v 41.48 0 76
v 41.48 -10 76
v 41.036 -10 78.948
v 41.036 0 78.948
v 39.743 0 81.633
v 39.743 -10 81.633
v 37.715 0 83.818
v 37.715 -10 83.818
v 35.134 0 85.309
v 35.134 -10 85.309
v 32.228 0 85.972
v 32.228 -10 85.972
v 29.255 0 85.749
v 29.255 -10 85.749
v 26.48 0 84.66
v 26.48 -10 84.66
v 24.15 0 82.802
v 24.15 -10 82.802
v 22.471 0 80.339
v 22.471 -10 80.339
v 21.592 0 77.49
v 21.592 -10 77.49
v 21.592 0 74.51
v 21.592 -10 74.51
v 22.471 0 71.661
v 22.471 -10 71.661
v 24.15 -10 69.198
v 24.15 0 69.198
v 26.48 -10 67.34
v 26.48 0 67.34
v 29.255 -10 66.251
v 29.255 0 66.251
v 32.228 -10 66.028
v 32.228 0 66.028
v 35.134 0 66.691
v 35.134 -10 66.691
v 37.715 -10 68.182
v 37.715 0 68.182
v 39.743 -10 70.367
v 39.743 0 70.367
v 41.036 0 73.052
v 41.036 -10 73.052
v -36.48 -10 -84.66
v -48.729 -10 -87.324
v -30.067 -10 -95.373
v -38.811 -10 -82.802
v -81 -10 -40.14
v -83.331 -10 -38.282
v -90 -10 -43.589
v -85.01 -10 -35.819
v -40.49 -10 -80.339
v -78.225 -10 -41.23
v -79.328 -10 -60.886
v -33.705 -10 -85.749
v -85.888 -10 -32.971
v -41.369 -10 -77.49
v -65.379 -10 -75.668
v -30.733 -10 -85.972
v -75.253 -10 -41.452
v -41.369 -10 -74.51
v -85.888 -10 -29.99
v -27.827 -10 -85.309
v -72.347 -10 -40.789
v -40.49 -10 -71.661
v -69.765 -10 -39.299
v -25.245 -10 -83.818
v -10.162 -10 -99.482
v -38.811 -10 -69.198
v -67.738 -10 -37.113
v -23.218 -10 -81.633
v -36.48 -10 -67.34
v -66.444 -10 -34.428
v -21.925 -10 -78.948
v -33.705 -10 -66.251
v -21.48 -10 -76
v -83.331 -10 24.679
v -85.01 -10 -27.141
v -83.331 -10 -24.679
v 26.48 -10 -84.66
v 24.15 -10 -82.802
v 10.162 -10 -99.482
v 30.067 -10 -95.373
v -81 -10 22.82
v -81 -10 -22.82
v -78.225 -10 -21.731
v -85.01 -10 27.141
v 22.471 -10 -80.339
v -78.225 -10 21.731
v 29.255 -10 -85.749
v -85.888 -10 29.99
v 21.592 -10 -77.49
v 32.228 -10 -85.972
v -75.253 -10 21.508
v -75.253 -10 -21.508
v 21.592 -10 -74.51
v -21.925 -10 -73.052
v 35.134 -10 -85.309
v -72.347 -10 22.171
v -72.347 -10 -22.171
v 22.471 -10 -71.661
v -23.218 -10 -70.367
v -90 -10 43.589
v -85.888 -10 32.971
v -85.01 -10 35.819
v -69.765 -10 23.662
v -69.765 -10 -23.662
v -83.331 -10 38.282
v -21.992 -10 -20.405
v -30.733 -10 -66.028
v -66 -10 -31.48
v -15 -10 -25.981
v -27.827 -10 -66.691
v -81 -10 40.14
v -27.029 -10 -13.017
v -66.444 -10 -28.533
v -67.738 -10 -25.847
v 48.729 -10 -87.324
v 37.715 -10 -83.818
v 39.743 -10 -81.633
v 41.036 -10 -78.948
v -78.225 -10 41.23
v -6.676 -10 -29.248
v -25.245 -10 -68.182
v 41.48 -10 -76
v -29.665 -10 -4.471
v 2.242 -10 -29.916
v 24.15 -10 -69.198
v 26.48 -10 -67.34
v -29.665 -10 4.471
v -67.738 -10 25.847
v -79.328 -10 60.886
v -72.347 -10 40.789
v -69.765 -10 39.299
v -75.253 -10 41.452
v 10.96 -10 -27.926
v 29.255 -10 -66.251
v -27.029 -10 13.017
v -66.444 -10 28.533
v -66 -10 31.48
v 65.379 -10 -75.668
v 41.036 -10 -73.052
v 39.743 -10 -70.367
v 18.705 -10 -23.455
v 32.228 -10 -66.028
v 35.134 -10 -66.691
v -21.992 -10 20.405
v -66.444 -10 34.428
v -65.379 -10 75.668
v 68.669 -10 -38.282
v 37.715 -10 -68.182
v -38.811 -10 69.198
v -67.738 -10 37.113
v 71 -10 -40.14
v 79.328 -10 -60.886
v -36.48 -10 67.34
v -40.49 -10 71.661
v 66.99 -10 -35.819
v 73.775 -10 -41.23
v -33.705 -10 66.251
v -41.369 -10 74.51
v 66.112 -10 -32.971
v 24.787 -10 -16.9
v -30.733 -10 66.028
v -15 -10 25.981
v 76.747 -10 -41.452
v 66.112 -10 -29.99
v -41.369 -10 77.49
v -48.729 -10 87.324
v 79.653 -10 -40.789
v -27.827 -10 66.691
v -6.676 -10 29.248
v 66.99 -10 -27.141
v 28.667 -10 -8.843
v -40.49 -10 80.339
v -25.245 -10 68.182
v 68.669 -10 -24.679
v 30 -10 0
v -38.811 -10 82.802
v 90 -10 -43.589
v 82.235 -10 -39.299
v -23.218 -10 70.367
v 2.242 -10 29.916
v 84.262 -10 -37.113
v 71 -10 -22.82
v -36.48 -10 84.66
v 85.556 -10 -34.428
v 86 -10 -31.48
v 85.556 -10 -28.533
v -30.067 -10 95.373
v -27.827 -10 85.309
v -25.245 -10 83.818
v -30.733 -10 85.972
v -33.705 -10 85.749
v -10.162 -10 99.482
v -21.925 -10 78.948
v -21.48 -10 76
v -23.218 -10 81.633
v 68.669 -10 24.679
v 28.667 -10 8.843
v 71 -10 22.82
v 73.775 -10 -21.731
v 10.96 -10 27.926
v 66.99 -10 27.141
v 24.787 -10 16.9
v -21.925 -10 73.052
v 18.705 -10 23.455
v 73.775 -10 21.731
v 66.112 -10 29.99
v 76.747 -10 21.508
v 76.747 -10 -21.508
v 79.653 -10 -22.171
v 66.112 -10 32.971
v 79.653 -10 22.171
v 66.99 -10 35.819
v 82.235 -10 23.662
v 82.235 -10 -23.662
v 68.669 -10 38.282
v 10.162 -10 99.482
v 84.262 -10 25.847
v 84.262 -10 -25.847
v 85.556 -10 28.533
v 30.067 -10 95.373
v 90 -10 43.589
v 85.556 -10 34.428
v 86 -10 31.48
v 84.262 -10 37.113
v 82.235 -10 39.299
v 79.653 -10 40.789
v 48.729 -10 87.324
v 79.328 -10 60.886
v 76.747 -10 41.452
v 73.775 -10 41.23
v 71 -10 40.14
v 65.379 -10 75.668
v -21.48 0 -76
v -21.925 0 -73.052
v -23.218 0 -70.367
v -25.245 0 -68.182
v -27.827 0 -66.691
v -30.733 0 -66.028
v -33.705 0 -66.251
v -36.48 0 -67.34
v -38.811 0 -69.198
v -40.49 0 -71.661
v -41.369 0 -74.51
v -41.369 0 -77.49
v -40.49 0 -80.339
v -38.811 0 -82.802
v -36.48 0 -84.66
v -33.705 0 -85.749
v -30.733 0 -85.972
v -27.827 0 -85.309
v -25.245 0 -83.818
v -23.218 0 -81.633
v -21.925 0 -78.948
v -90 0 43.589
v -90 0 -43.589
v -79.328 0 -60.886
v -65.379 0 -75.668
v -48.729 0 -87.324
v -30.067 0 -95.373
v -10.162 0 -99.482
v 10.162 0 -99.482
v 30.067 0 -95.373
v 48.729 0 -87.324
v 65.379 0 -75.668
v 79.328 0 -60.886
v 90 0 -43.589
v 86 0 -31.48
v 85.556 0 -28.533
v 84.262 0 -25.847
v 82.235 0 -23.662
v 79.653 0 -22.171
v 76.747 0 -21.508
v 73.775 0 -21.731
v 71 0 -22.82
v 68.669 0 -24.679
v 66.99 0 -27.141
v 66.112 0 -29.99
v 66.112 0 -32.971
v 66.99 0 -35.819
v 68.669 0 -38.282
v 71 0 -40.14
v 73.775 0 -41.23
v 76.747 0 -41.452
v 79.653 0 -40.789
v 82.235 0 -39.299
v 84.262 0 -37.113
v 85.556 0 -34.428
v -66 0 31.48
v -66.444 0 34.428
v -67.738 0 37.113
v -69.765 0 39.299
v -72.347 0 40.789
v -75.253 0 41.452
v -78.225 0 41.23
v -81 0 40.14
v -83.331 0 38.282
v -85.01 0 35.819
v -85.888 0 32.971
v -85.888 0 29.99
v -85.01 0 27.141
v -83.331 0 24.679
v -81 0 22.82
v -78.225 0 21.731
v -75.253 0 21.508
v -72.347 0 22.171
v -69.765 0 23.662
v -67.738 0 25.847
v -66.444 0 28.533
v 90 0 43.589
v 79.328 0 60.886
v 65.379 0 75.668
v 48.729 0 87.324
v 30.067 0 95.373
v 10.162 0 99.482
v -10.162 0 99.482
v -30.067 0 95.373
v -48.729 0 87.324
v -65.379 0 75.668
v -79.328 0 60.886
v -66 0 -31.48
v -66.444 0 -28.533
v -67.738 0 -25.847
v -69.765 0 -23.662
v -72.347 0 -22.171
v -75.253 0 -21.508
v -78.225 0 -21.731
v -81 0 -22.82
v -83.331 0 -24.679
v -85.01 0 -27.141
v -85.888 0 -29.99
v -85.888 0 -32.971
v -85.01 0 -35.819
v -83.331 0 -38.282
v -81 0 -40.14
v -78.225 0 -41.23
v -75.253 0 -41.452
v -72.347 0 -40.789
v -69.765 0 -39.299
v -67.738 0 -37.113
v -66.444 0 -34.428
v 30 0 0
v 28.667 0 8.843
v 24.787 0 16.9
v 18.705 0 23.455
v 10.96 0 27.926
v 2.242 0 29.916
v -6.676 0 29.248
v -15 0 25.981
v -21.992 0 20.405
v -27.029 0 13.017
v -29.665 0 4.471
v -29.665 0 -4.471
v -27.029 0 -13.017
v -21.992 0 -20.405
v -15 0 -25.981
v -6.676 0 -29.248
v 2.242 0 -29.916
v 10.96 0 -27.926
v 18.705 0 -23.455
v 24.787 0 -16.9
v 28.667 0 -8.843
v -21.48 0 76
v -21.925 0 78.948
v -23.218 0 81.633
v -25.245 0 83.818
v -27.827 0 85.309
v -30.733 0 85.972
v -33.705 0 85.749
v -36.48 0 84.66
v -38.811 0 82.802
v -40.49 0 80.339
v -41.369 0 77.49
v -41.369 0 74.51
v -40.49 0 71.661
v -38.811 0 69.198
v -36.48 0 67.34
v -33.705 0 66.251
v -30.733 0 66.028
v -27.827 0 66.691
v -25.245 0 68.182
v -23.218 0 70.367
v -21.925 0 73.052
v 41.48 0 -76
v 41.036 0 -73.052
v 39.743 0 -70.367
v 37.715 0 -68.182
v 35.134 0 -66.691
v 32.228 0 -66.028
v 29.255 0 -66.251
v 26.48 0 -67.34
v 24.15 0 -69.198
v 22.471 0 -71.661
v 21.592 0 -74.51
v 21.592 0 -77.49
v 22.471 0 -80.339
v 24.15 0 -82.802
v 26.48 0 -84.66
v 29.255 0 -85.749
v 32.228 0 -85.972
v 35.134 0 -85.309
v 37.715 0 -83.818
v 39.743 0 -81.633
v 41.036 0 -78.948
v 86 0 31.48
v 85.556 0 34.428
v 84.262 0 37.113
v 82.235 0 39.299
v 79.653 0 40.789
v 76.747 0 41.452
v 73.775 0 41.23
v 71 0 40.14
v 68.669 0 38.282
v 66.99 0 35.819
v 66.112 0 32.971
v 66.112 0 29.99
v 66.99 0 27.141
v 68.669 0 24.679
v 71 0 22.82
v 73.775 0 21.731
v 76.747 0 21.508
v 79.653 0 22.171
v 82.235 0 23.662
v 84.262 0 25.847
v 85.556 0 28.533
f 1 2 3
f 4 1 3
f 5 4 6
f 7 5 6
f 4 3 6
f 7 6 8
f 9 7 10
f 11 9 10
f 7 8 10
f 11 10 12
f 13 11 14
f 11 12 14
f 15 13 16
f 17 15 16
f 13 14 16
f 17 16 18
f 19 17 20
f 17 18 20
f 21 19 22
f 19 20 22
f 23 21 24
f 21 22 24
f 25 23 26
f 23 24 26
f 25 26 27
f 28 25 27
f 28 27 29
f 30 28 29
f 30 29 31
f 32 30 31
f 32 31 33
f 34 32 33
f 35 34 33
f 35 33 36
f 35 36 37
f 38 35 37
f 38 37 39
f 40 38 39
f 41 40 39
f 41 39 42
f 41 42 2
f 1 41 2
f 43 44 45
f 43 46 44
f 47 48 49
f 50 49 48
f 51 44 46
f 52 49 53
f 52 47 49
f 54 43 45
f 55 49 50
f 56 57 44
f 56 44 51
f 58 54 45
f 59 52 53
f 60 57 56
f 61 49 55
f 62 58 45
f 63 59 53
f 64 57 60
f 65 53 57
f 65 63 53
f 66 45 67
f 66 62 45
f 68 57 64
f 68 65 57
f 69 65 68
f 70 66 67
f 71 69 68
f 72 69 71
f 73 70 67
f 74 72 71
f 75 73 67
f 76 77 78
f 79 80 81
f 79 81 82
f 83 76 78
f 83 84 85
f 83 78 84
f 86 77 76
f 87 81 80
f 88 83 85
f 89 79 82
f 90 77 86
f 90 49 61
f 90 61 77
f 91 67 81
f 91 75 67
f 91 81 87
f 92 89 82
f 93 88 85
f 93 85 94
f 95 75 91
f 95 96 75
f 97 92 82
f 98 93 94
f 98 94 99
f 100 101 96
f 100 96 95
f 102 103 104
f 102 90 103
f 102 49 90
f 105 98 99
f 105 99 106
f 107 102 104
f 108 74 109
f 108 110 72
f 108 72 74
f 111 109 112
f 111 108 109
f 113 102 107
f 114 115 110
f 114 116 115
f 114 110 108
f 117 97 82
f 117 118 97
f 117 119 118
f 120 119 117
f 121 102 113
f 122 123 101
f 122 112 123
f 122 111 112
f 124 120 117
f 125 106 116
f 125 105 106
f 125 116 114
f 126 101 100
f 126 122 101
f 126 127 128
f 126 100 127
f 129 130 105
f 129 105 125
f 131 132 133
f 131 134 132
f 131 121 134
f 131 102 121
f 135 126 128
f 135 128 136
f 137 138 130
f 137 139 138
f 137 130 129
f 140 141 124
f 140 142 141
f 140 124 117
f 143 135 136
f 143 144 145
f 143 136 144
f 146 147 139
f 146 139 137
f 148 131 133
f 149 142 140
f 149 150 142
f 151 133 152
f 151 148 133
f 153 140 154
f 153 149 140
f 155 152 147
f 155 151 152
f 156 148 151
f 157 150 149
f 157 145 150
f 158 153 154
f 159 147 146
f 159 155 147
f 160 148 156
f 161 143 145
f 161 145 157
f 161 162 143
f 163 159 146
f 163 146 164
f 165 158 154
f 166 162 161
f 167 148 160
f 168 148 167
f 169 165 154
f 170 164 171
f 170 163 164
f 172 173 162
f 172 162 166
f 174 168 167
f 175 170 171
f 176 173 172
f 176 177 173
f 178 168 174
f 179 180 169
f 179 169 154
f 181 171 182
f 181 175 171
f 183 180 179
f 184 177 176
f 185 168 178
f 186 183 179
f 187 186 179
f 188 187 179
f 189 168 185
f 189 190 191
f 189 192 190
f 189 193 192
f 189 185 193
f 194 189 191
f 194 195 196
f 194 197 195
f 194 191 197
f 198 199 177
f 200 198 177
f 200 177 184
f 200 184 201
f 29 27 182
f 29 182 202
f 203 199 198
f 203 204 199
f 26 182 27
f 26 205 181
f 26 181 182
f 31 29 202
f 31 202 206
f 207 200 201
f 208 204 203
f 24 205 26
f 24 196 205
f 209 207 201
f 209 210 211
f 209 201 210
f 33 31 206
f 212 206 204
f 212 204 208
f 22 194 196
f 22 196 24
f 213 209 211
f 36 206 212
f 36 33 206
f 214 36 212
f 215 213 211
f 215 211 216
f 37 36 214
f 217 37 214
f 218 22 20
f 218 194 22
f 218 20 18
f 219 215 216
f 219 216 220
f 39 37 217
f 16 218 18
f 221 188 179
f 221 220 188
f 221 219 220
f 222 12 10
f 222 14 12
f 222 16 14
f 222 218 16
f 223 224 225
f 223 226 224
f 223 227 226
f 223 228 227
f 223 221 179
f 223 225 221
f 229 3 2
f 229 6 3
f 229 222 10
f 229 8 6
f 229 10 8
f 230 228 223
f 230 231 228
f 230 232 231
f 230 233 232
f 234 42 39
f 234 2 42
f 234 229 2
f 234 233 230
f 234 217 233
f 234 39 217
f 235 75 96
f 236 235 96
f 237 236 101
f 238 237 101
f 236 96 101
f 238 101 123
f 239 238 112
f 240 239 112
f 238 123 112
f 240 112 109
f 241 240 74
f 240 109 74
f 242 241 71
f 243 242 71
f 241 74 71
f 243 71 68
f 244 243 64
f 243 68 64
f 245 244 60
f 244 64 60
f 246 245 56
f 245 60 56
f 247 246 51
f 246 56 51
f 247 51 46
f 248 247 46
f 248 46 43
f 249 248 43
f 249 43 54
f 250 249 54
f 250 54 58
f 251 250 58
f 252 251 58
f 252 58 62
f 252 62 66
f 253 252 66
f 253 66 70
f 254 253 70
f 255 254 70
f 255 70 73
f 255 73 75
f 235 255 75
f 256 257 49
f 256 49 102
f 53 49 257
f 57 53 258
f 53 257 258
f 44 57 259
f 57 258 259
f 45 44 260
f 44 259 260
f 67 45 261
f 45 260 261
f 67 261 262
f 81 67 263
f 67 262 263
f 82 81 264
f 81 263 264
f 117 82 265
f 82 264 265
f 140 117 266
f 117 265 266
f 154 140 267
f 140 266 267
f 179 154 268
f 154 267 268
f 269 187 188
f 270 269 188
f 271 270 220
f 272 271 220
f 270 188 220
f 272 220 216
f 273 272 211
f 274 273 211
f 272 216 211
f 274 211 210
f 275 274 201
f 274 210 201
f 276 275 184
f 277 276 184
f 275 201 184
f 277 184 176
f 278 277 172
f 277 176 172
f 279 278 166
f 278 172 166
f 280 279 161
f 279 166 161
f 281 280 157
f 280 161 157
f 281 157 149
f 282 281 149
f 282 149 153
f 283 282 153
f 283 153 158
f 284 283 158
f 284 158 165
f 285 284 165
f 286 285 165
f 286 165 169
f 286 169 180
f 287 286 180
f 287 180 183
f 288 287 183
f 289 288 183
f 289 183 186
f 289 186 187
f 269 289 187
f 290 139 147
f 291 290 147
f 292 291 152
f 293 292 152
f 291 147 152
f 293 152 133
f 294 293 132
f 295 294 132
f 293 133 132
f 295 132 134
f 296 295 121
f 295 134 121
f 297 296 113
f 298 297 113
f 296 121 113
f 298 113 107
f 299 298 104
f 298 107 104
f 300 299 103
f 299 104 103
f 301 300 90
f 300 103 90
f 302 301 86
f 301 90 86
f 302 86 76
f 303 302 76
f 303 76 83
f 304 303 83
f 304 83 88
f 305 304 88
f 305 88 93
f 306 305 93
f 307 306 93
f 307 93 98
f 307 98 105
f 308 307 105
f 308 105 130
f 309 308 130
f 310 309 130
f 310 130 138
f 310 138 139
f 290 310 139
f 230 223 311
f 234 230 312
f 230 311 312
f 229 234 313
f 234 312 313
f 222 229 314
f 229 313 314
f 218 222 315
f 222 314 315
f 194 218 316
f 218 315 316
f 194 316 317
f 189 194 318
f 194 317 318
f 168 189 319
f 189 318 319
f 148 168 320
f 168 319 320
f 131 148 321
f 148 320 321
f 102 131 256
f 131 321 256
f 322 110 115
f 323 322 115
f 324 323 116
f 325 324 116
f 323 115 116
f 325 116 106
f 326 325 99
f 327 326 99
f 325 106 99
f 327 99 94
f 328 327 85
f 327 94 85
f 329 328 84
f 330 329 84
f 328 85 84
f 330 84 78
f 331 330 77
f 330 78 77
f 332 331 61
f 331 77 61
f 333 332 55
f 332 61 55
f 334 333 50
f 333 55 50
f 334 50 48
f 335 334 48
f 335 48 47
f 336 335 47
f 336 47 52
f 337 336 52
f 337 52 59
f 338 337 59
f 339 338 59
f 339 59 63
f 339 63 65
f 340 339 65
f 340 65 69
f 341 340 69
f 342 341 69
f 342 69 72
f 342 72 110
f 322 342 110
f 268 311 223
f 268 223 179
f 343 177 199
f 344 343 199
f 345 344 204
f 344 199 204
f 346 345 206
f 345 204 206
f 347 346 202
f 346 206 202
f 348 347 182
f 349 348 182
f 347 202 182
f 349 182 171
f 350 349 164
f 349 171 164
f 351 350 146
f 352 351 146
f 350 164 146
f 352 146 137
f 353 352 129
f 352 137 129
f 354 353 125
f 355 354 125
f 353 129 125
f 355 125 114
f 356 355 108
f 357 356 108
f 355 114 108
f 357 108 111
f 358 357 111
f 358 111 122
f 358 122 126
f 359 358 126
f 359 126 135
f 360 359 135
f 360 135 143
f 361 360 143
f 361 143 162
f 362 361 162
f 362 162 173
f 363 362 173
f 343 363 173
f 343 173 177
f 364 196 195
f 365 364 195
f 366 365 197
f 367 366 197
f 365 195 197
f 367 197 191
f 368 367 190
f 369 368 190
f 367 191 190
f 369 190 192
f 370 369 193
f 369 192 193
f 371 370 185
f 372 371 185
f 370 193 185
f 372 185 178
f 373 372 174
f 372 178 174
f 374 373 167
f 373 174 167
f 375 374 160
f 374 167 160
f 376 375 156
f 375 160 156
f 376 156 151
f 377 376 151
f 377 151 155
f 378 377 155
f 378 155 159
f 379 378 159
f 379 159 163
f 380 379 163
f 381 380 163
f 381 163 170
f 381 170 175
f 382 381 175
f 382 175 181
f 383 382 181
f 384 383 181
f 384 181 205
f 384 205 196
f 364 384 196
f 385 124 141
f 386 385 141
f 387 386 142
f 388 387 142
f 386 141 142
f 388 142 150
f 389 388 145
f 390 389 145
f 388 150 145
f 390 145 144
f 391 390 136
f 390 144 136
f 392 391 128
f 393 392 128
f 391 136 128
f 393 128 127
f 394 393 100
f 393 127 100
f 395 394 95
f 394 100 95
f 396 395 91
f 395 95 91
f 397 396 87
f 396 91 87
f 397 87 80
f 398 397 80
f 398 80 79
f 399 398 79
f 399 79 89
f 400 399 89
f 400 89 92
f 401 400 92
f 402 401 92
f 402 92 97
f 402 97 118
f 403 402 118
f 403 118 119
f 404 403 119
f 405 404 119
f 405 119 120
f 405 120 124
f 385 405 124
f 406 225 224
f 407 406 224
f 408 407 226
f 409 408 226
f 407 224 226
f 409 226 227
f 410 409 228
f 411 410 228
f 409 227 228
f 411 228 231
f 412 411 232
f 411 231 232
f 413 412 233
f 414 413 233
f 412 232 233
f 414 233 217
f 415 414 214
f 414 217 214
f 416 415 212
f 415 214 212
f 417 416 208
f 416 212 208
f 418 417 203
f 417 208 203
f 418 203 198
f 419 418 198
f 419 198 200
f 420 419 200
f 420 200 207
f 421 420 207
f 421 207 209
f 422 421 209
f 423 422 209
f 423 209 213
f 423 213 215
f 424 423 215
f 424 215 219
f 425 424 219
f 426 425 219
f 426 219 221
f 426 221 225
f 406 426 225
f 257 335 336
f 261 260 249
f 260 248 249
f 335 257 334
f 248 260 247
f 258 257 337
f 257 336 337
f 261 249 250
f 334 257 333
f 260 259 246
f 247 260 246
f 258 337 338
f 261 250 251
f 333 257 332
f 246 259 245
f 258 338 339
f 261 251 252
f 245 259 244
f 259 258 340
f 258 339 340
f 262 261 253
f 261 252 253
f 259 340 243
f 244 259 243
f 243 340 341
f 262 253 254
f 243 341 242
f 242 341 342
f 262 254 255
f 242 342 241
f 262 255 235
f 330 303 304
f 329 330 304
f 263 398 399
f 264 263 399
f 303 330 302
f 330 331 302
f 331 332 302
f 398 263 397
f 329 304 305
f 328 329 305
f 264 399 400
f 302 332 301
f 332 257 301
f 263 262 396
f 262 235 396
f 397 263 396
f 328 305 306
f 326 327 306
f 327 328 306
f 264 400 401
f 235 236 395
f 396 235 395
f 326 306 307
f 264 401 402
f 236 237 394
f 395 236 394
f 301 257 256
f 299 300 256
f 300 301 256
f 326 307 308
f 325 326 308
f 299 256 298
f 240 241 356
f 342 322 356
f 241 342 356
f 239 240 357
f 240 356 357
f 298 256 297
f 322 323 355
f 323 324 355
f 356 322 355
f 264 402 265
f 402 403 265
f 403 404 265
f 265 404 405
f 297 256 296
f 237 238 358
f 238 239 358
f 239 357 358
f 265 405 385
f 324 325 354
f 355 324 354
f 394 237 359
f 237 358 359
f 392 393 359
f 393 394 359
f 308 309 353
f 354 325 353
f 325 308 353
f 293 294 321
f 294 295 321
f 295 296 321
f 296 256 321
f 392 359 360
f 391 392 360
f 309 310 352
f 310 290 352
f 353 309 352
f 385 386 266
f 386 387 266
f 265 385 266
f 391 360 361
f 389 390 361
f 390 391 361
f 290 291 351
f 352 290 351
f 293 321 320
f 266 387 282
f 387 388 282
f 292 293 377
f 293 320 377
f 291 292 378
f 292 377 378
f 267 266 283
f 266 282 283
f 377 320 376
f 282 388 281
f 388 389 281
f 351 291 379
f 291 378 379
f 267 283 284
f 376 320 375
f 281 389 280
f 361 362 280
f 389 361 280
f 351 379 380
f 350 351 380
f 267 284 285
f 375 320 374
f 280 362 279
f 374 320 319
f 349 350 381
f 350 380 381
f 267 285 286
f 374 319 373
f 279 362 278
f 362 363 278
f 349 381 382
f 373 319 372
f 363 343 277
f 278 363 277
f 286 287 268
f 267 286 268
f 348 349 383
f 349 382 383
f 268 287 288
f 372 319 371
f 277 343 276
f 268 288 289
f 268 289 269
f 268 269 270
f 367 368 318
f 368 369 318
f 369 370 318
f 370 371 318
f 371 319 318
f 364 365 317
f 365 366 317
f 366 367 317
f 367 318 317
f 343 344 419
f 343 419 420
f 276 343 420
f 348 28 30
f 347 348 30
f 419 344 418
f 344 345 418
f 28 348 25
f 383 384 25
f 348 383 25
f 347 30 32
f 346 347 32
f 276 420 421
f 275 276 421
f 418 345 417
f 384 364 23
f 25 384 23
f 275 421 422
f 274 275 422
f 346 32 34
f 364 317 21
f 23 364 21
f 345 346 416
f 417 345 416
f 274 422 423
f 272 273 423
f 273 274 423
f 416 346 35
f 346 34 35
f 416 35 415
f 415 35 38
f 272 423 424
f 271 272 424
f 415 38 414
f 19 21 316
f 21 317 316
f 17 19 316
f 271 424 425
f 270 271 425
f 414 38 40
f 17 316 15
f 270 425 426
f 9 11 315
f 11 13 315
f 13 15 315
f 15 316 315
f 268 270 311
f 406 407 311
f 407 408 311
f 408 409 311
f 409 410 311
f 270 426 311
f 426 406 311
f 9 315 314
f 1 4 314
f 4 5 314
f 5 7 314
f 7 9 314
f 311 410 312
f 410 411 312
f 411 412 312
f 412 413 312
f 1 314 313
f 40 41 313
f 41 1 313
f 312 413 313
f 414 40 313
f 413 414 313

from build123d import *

# Parameters (mm, degrees)
F0_R     = 100
F2_DEPTH = 10
F3_DEPTH = 10.001
F4_R     = 10
F5_DEPTH = 25
F6_R     = 30
F7_DEPTH = 25


with BuildPart() as f2:
    # F0 (on Front) → F2 (new body)
    with BuildSketch(Plane.XZ):
        Circle(F0_R)
    extrude(amount=F2_DEPTH)

    # F1 (on face) → F3 (cut, through all)
    with BuildSketch(Plane.XZ):
        with BuildLine():
            ThreePointArc((-90, 43.5889894354), (-53.1088554596, 84.7316320613), (0, 100))
            Line((0, 100), (-90, 100))
            Line((-90, 100), (-90, 43.5889894354))
        make_face()
        with BuildLine():
            Line((-90, -43.5889894354), (-90, 43.5889894354))
            ThreePointArc((-90, 43.5889894354), (-100, 0), (-90, -43.5889894354))
        make_face()
        with BuildLine():
            ThreePointArc((100, 0), (97.4679434481, 22.360679775), (90, 43.5889894354))
            Line((90, 43.5889894354), (90, -43.5889894354))
            ThreePointArc((90, -43.5889894354), (97.4679434481, -22.360679775), (100, 0))
        make_face()
    extrude(amount=F3_DEPTH, mode=Mode.SUBTRACT)

    # F4 (on face) → F5 (cut)
    with BuildSketch(Plane.XZ.offset(10)):
        with Locations((-76, 31.4802307404)):
            Circle(F4_R)
        with Locations((-76, -31.4802307404)):
            Circle(F4_R)
        with Locations((-31.4802307404, -76)):
            Circle(F4_R)
        with Locations((31.4802307404, -76)):
            Circle(F4_R)
        with Locations((76, -31.4802307404)):
            Circle(F4_R)
        with Locations((76, 31.4802307404)):
            Circle(F4_R)
        with Locations((31.4802307404, 76)):
            Circle(F4_R)
        with Locations((-31.4802307404, 76)):
            Circle(F4_R)
    extrude(amount=-F5_DEPTH, mode=Mode.SUBTRACT)

    # F6 (on face) → F7 (cut)
    with BuildSketch(Plane.XZ.offset(10)):
        Circle(F6_R)
    extrude(amount=-F7_DEPTH, mode=Mode.SUBTRACT)


solid = f2.part
